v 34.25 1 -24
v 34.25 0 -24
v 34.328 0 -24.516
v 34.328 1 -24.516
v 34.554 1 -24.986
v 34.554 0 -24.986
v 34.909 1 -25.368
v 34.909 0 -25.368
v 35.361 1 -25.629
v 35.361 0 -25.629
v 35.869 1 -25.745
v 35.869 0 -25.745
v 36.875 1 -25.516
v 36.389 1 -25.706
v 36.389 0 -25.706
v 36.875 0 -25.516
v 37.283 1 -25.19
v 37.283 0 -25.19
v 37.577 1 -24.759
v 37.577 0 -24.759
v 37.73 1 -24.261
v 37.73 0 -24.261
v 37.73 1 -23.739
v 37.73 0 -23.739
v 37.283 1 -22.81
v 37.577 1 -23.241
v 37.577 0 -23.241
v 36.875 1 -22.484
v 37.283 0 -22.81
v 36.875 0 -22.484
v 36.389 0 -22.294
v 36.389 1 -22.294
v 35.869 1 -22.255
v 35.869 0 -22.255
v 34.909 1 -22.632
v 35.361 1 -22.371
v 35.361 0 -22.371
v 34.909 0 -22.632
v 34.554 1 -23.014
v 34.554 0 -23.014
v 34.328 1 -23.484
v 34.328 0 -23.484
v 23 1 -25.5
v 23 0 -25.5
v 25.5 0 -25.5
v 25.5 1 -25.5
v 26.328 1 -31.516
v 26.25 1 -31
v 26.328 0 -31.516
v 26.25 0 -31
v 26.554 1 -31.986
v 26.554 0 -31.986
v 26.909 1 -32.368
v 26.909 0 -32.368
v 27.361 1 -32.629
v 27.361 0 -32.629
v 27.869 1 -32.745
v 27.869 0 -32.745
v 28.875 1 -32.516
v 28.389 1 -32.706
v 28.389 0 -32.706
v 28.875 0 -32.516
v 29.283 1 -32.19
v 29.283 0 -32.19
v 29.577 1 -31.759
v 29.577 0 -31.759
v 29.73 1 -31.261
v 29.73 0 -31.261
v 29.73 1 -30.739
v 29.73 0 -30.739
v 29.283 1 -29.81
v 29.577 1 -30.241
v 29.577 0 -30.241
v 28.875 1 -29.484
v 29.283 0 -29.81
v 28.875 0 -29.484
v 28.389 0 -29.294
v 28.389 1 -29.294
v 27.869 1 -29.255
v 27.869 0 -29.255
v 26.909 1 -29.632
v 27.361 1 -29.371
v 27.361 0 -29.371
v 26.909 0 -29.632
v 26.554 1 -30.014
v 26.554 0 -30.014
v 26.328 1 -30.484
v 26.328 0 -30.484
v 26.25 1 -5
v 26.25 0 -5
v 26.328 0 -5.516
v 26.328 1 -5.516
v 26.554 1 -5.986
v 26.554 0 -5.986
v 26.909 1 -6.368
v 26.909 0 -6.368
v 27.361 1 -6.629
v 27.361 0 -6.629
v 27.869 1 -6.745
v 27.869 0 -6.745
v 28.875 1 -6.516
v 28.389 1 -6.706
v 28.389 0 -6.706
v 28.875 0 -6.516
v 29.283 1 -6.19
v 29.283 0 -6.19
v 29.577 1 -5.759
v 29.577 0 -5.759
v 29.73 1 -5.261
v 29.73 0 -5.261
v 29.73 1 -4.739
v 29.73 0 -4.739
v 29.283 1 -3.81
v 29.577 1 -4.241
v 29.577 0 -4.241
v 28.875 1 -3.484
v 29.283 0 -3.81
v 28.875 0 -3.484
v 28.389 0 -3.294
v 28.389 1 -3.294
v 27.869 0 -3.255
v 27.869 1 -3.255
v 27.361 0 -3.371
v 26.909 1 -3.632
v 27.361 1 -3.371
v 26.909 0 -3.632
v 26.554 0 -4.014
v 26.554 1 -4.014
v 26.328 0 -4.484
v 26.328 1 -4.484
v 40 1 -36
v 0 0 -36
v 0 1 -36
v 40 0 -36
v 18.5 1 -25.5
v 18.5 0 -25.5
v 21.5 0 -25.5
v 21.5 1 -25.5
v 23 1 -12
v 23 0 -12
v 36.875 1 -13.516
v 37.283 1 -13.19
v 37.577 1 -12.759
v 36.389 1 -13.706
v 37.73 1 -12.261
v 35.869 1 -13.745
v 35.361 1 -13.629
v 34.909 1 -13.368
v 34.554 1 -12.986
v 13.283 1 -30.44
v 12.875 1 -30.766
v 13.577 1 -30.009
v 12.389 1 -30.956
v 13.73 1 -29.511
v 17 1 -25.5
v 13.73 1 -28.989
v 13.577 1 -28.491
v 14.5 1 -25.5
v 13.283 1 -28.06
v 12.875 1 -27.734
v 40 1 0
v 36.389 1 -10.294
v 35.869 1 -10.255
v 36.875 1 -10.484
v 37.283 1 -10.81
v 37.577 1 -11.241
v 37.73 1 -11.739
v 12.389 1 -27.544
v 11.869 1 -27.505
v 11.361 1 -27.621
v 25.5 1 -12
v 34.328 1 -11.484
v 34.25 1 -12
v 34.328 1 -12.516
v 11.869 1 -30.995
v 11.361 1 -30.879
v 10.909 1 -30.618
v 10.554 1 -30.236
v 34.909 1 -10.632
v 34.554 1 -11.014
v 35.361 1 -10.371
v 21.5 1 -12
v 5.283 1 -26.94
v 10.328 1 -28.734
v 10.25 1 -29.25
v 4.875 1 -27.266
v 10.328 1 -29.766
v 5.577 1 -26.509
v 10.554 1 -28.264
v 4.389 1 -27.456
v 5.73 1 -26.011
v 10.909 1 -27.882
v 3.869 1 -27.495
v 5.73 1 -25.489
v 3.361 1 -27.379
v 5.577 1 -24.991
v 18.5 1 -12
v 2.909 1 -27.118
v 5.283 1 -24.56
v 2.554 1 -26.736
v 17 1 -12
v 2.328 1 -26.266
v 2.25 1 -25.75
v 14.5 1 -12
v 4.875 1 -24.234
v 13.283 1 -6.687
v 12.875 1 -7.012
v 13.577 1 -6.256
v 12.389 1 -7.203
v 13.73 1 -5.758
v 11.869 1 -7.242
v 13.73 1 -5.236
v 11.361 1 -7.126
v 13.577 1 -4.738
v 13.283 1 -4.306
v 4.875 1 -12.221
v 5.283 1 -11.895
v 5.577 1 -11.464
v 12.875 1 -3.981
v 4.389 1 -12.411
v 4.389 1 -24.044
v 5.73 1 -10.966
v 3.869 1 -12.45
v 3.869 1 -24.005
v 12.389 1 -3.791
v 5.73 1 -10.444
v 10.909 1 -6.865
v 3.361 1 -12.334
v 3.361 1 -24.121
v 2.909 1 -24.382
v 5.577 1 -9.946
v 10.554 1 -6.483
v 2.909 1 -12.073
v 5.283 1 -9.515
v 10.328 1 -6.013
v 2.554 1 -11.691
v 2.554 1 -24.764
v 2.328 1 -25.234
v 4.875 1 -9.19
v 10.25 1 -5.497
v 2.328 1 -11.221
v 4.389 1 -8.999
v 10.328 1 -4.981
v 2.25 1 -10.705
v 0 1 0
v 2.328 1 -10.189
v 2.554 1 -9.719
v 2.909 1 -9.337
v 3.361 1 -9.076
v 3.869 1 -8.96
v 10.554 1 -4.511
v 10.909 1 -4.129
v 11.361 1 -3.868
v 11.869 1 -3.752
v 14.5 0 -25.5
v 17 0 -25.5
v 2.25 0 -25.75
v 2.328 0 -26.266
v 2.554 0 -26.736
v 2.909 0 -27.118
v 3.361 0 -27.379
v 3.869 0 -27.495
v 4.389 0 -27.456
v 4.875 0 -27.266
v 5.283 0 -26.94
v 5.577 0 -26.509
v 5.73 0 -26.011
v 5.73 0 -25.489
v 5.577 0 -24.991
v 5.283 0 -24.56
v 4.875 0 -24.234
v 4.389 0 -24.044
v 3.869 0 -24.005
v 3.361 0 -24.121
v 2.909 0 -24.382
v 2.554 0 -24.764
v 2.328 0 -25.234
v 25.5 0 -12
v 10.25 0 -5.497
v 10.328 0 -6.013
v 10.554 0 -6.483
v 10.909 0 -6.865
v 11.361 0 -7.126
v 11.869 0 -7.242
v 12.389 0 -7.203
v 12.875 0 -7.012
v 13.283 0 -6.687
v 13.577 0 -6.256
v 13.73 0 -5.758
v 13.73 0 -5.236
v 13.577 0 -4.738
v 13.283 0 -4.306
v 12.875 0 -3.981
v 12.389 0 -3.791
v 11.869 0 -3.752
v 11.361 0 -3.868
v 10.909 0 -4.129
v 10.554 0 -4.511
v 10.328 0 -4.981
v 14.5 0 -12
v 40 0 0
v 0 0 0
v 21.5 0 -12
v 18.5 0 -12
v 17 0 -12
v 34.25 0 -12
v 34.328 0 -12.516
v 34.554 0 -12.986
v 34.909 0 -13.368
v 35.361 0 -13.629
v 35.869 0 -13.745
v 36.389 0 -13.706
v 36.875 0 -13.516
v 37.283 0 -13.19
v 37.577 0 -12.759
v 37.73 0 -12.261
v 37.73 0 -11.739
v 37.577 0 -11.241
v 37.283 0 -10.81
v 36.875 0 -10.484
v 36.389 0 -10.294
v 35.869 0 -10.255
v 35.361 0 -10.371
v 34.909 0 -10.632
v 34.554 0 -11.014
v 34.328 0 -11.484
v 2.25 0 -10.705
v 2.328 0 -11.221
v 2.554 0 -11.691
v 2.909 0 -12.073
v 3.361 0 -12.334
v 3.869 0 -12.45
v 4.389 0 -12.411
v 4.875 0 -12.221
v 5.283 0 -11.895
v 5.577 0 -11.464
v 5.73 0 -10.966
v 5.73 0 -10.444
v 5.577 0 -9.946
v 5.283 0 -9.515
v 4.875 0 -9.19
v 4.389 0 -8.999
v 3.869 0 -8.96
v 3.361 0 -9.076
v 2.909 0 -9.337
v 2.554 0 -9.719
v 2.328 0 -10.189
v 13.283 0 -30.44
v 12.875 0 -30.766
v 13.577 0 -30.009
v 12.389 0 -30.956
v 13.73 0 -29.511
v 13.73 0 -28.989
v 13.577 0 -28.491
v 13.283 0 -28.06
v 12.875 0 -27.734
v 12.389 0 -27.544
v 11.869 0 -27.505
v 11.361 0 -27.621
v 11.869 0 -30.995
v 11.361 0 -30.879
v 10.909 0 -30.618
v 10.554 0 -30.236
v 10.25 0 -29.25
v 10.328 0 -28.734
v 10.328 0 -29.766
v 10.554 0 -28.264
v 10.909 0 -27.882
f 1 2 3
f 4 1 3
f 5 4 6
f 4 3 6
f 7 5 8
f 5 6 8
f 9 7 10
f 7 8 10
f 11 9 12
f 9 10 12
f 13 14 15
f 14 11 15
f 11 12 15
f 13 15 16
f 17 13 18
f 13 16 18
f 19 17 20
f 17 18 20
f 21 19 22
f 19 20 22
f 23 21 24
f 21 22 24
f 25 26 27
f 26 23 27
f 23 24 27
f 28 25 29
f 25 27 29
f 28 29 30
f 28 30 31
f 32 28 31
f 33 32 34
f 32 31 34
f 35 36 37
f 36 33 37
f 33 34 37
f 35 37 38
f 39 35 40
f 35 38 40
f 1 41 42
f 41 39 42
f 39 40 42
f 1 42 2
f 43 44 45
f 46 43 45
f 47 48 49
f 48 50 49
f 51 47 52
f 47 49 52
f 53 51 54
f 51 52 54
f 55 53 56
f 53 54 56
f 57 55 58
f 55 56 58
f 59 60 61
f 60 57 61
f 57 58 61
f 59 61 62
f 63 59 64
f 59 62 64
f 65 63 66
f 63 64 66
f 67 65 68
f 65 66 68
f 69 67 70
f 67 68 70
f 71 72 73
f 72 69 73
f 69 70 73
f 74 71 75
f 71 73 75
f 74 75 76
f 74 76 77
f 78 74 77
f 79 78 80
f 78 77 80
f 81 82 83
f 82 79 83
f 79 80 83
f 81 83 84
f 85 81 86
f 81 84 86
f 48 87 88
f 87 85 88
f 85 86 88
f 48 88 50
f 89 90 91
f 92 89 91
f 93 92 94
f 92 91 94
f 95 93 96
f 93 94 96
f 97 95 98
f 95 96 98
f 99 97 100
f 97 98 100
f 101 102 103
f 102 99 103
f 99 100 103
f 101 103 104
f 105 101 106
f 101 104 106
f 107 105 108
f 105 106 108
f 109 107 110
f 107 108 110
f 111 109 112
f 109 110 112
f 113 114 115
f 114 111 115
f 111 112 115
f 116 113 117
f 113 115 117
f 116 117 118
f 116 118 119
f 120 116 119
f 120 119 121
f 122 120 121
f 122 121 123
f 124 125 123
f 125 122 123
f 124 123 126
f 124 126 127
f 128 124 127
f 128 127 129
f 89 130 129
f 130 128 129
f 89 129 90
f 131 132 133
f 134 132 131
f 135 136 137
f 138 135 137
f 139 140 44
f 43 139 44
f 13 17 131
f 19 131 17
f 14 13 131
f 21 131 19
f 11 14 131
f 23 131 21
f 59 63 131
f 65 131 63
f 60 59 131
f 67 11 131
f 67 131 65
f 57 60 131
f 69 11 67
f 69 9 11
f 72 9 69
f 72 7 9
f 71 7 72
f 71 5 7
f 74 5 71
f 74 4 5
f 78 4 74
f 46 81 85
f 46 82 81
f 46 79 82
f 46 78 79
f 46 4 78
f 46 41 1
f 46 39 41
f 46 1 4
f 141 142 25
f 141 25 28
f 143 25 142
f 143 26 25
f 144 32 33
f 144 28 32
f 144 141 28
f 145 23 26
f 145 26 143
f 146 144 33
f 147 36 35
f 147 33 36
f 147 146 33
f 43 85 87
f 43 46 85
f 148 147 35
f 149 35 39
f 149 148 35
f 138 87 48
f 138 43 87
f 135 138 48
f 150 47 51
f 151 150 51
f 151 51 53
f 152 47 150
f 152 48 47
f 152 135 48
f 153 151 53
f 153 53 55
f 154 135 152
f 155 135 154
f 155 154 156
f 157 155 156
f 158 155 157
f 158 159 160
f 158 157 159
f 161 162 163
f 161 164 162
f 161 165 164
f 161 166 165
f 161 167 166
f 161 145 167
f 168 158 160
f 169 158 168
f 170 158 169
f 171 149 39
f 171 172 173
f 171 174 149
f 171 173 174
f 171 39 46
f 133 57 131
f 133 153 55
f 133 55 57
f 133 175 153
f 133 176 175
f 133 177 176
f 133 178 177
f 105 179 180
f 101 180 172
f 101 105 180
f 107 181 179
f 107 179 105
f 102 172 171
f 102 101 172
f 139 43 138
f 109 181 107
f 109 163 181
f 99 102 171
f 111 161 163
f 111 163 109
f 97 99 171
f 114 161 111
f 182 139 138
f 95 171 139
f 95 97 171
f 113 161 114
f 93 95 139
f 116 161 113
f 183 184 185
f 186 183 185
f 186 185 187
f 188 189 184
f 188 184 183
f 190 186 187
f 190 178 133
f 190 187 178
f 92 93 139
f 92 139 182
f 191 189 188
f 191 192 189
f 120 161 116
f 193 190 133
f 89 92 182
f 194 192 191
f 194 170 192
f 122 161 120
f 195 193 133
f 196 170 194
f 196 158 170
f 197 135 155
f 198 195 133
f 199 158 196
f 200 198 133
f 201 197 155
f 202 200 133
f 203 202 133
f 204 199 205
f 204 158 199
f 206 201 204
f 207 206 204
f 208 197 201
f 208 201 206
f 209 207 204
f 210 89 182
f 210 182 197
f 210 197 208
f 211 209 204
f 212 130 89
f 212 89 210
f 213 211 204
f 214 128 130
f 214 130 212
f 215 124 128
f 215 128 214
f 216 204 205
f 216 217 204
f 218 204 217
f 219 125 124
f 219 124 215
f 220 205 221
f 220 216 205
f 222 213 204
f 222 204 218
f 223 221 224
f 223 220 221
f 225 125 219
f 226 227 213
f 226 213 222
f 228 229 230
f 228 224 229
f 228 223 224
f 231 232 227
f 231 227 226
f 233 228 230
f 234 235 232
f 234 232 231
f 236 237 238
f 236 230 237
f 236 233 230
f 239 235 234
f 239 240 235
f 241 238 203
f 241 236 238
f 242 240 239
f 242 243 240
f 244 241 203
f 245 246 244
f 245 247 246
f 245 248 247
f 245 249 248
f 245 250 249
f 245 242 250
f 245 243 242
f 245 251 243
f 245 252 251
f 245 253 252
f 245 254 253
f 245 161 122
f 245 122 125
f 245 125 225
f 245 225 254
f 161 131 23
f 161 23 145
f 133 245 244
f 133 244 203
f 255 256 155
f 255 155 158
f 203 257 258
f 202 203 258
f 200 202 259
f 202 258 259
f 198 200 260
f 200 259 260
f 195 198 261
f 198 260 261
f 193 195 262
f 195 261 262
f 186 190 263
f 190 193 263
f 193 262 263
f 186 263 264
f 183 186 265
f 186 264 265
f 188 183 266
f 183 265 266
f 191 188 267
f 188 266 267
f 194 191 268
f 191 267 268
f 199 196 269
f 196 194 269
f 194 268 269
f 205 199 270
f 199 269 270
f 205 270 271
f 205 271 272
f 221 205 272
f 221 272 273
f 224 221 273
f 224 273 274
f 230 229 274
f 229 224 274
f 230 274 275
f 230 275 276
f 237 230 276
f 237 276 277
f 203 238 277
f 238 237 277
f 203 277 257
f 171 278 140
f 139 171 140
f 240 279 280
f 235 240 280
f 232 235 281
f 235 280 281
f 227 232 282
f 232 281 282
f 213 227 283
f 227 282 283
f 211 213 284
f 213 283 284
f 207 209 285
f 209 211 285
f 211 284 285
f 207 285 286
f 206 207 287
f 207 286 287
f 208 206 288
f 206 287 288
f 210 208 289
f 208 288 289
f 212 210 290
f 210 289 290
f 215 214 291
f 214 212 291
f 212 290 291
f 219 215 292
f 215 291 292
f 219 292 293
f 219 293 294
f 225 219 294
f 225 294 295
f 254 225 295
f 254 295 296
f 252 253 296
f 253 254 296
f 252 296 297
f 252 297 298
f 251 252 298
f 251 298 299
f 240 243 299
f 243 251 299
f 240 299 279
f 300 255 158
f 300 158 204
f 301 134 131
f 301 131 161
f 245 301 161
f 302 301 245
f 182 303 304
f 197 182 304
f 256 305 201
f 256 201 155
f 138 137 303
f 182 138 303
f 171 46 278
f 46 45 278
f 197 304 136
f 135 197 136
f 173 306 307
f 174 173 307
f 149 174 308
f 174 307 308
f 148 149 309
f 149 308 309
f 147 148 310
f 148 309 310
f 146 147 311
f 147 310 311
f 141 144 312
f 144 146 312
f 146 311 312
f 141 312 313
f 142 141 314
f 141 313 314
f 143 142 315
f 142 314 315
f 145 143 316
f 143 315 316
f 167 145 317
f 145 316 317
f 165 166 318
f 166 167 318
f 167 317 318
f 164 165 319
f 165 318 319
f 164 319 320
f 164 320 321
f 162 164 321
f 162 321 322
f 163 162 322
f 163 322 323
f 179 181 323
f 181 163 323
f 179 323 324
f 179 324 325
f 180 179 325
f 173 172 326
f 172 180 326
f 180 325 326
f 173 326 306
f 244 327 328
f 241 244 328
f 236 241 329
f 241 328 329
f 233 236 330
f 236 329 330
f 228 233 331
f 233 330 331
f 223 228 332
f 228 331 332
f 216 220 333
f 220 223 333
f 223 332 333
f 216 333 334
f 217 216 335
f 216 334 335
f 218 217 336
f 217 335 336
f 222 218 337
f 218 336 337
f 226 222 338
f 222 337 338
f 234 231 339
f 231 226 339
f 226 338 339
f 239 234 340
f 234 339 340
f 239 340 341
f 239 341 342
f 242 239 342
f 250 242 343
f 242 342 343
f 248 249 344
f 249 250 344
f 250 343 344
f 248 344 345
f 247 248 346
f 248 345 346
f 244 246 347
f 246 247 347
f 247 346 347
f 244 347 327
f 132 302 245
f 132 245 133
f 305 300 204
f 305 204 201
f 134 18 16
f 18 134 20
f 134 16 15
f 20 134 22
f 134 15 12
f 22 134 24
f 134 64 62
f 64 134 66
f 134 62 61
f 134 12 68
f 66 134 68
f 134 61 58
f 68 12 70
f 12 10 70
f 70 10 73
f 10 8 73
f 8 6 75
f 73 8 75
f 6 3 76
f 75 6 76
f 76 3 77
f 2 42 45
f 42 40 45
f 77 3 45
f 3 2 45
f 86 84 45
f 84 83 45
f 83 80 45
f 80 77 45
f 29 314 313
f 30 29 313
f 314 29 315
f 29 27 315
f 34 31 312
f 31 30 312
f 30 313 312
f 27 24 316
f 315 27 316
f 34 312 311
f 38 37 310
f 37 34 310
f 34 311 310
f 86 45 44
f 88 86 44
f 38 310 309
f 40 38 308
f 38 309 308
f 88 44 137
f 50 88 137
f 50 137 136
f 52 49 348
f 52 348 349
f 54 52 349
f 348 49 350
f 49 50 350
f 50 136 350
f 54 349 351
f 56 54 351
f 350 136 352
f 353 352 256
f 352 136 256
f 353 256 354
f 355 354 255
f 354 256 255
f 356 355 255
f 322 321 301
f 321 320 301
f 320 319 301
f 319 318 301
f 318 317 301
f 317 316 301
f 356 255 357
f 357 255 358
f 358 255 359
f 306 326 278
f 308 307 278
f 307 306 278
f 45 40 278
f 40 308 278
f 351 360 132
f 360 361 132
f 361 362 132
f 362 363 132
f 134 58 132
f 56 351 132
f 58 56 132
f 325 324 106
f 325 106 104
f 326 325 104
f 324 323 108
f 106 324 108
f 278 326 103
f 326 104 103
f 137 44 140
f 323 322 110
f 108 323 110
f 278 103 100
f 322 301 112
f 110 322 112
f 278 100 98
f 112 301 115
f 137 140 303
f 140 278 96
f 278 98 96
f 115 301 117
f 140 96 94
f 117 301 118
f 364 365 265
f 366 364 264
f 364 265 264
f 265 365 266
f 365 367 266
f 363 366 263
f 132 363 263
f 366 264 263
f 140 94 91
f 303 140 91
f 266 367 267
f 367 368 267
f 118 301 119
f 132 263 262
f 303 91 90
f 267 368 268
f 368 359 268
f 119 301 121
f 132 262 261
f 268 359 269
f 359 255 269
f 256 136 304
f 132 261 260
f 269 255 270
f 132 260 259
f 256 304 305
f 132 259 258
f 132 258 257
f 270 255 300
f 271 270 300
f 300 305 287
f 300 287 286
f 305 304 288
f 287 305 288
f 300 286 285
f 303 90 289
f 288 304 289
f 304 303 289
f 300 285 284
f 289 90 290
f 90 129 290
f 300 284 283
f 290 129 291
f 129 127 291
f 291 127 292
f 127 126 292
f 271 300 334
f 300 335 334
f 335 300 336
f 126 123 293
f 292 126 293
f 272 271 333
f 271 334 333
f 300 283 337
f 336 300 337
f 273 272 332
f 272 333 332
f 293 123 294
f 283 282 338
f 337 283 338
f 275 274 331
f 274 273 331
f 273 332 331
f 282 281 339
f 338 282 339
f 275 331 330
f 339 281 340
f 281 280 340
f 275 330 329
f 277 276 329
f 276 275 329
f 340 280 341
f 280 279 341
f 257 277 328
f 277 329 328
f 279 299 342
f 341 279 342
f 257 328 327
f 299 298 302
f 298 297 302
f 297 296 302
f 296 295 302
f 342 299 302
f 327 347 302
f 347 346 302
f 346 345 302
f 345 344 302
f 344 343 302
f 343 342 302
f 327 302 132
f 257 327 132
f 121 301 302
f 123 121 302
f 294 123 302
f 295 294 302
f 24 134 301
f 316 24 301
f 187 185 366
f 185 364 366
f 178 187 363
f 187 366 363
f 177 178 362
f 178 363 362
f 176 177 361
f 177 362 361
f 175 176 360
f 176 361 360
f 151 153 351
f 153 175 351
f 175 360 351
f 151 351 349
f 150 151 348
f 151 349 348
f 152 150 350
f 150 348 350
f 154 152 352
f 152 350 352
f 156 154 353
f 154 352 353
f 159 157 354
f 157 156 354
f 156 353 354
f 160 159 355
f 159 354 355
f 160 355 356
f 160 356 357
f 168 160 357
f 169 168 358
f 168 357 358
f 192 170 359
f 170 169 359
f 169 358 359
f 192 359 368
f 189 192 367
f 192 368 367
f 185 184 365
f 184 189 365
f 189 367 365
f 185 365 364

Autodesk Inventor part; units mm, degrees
ref_plane "YZ Plane" through (0, 0, 0) normal (1, 0, 0) x (0, 1, 0)
ref_plane "XZ Plane" through (0, 0, 0) normal (0, 1, 0) x (-1, 0, 0)
ref_plane "XY Plane" through (0, 0, 0) normal (0, 0, 1) x (1, 0, 0)
sketch "Sketch1" plane through (0, 0, 0) normal (0, 1, 0) x (-1, 0, 0)
  line L0 (0, 0) -> (0, -36)
  line L1 (0, -36) -> (-40, -36)
  line L2 (-40, -36) -> (-40, 0)
  line L3 (-40, 0) -> (0, 0)
  line L4 (0, -18) -> (-40, -18) construction
  line L5 (-20, 0) -> (-20, -36) construction
  circle A0 centre (-36, -12) radius 1.75
  circle A1 centre (-36, -24) radius 1.75
  circle A2 centre (-4, -10.7051) radius 1.75
  circle A3 centre (-4, -25.75) radius 1.75
  circle A4 centre (-28, -5) radius 1.75
  circle A5 centre (-12, -5.4968) radius 1.75
  circle A6 centre (-28, -31) radius 1.75
  circle A7 centre (-12, -29.25) radius 1.75
  line L6 (-20, -18) -> (-18.5, -18) construction
  line L7 (-20, -18) -> (-21.5, -18) construction
  line L8 (-18.5, -12) -> (-18.5, -25.5) construction
  line L9 (-18.5, -12) -> (-18.5, -25.5)
  line L10 (-18.5, -25.5) -> (-21.5, -25.5)
  line L11 (-21.5, -25.5) -> (-21.5, -12)
  line L12 (-21.5, -12) -> (-18.5, -12)
  line L13 (-18.5, -16.9522) -> (-17, -16.9522) construction
  line L14 (-21.5, -16.9522) -> (-23, -16.9522) construction
  line L15 (-23, -12) -> (-23, -25.5) construction
  line L16 (-23, -12) -> (-23, -25.5)
  line L17 (-23, -25.5) -> (-25.5, -25.5)
  line L18 (-25.5, -25.5) -> (-25.5, -12)
  line L19 (-25.5, -12) -> (-23, -12)
  line L20 (-17, -12) -> (-17, -25.5)
  line L21 (-17, -25.5) -> (-14.5, -25.5)
  line L22 (-14.5, -25.5) -> (-14.5, -12)
  line L23 (-14.5, -12) -> (-17, -12)
  dimension "d0" = 36
  dimension "d1" = 40
  dimension "d4" = 3.5
  dimension "d5" = 6
  dimension "d7" = 3.5
  dimension "d8" = 3.5
  dimension "d14" = 32
  dimension "d15" = 4
  dimension "d16" = 4
  dimension "d17" = 4
  dimension "d19" = 3.5
  dimension "d20" = 3.5
  dimension "d21" = 3.5
  dimension "d23" = 5
  dimension "d24" = 5
  dimension "d28" = 16
  dimension "d29" = 12
  dimension "d30" = 3.5
  dimension "d31" = 16
  dimension "d32" = 10.7051
  dimension "d33" = 25.75
  dimension "d34" = 5.4968
  dimension "d35" = 29.25
  dimension "d42" = 3
  dimension "d45" = 1.5
  dimension "d53" = 2.5
  dimension "d54" = 90
  dimension "d56" = 23
  dimension "d61" = 12
  dimension "d62" = 12
  dimension "d66" = 13.5
  dimension "d67" = 2.5
  dimension "d70" = 14.5
  dimension "d71" = 4.9522
  dimension "d72" = 24
  dimension "d73" = 13.5
  dimension "d74" = 4.9522
  dimension "d75" = 0
  dimension "d76" = 13.5
  dimension "d77" = 17
  dimension "d78" = 18.5
  dimension "d79" = 21.5
  dimension "d80" = 23
  dimension "d81" = 12
extrude "Extrusion3" add sketch "Sketch1" along normal blind 1
properties part number "valvle plate"
